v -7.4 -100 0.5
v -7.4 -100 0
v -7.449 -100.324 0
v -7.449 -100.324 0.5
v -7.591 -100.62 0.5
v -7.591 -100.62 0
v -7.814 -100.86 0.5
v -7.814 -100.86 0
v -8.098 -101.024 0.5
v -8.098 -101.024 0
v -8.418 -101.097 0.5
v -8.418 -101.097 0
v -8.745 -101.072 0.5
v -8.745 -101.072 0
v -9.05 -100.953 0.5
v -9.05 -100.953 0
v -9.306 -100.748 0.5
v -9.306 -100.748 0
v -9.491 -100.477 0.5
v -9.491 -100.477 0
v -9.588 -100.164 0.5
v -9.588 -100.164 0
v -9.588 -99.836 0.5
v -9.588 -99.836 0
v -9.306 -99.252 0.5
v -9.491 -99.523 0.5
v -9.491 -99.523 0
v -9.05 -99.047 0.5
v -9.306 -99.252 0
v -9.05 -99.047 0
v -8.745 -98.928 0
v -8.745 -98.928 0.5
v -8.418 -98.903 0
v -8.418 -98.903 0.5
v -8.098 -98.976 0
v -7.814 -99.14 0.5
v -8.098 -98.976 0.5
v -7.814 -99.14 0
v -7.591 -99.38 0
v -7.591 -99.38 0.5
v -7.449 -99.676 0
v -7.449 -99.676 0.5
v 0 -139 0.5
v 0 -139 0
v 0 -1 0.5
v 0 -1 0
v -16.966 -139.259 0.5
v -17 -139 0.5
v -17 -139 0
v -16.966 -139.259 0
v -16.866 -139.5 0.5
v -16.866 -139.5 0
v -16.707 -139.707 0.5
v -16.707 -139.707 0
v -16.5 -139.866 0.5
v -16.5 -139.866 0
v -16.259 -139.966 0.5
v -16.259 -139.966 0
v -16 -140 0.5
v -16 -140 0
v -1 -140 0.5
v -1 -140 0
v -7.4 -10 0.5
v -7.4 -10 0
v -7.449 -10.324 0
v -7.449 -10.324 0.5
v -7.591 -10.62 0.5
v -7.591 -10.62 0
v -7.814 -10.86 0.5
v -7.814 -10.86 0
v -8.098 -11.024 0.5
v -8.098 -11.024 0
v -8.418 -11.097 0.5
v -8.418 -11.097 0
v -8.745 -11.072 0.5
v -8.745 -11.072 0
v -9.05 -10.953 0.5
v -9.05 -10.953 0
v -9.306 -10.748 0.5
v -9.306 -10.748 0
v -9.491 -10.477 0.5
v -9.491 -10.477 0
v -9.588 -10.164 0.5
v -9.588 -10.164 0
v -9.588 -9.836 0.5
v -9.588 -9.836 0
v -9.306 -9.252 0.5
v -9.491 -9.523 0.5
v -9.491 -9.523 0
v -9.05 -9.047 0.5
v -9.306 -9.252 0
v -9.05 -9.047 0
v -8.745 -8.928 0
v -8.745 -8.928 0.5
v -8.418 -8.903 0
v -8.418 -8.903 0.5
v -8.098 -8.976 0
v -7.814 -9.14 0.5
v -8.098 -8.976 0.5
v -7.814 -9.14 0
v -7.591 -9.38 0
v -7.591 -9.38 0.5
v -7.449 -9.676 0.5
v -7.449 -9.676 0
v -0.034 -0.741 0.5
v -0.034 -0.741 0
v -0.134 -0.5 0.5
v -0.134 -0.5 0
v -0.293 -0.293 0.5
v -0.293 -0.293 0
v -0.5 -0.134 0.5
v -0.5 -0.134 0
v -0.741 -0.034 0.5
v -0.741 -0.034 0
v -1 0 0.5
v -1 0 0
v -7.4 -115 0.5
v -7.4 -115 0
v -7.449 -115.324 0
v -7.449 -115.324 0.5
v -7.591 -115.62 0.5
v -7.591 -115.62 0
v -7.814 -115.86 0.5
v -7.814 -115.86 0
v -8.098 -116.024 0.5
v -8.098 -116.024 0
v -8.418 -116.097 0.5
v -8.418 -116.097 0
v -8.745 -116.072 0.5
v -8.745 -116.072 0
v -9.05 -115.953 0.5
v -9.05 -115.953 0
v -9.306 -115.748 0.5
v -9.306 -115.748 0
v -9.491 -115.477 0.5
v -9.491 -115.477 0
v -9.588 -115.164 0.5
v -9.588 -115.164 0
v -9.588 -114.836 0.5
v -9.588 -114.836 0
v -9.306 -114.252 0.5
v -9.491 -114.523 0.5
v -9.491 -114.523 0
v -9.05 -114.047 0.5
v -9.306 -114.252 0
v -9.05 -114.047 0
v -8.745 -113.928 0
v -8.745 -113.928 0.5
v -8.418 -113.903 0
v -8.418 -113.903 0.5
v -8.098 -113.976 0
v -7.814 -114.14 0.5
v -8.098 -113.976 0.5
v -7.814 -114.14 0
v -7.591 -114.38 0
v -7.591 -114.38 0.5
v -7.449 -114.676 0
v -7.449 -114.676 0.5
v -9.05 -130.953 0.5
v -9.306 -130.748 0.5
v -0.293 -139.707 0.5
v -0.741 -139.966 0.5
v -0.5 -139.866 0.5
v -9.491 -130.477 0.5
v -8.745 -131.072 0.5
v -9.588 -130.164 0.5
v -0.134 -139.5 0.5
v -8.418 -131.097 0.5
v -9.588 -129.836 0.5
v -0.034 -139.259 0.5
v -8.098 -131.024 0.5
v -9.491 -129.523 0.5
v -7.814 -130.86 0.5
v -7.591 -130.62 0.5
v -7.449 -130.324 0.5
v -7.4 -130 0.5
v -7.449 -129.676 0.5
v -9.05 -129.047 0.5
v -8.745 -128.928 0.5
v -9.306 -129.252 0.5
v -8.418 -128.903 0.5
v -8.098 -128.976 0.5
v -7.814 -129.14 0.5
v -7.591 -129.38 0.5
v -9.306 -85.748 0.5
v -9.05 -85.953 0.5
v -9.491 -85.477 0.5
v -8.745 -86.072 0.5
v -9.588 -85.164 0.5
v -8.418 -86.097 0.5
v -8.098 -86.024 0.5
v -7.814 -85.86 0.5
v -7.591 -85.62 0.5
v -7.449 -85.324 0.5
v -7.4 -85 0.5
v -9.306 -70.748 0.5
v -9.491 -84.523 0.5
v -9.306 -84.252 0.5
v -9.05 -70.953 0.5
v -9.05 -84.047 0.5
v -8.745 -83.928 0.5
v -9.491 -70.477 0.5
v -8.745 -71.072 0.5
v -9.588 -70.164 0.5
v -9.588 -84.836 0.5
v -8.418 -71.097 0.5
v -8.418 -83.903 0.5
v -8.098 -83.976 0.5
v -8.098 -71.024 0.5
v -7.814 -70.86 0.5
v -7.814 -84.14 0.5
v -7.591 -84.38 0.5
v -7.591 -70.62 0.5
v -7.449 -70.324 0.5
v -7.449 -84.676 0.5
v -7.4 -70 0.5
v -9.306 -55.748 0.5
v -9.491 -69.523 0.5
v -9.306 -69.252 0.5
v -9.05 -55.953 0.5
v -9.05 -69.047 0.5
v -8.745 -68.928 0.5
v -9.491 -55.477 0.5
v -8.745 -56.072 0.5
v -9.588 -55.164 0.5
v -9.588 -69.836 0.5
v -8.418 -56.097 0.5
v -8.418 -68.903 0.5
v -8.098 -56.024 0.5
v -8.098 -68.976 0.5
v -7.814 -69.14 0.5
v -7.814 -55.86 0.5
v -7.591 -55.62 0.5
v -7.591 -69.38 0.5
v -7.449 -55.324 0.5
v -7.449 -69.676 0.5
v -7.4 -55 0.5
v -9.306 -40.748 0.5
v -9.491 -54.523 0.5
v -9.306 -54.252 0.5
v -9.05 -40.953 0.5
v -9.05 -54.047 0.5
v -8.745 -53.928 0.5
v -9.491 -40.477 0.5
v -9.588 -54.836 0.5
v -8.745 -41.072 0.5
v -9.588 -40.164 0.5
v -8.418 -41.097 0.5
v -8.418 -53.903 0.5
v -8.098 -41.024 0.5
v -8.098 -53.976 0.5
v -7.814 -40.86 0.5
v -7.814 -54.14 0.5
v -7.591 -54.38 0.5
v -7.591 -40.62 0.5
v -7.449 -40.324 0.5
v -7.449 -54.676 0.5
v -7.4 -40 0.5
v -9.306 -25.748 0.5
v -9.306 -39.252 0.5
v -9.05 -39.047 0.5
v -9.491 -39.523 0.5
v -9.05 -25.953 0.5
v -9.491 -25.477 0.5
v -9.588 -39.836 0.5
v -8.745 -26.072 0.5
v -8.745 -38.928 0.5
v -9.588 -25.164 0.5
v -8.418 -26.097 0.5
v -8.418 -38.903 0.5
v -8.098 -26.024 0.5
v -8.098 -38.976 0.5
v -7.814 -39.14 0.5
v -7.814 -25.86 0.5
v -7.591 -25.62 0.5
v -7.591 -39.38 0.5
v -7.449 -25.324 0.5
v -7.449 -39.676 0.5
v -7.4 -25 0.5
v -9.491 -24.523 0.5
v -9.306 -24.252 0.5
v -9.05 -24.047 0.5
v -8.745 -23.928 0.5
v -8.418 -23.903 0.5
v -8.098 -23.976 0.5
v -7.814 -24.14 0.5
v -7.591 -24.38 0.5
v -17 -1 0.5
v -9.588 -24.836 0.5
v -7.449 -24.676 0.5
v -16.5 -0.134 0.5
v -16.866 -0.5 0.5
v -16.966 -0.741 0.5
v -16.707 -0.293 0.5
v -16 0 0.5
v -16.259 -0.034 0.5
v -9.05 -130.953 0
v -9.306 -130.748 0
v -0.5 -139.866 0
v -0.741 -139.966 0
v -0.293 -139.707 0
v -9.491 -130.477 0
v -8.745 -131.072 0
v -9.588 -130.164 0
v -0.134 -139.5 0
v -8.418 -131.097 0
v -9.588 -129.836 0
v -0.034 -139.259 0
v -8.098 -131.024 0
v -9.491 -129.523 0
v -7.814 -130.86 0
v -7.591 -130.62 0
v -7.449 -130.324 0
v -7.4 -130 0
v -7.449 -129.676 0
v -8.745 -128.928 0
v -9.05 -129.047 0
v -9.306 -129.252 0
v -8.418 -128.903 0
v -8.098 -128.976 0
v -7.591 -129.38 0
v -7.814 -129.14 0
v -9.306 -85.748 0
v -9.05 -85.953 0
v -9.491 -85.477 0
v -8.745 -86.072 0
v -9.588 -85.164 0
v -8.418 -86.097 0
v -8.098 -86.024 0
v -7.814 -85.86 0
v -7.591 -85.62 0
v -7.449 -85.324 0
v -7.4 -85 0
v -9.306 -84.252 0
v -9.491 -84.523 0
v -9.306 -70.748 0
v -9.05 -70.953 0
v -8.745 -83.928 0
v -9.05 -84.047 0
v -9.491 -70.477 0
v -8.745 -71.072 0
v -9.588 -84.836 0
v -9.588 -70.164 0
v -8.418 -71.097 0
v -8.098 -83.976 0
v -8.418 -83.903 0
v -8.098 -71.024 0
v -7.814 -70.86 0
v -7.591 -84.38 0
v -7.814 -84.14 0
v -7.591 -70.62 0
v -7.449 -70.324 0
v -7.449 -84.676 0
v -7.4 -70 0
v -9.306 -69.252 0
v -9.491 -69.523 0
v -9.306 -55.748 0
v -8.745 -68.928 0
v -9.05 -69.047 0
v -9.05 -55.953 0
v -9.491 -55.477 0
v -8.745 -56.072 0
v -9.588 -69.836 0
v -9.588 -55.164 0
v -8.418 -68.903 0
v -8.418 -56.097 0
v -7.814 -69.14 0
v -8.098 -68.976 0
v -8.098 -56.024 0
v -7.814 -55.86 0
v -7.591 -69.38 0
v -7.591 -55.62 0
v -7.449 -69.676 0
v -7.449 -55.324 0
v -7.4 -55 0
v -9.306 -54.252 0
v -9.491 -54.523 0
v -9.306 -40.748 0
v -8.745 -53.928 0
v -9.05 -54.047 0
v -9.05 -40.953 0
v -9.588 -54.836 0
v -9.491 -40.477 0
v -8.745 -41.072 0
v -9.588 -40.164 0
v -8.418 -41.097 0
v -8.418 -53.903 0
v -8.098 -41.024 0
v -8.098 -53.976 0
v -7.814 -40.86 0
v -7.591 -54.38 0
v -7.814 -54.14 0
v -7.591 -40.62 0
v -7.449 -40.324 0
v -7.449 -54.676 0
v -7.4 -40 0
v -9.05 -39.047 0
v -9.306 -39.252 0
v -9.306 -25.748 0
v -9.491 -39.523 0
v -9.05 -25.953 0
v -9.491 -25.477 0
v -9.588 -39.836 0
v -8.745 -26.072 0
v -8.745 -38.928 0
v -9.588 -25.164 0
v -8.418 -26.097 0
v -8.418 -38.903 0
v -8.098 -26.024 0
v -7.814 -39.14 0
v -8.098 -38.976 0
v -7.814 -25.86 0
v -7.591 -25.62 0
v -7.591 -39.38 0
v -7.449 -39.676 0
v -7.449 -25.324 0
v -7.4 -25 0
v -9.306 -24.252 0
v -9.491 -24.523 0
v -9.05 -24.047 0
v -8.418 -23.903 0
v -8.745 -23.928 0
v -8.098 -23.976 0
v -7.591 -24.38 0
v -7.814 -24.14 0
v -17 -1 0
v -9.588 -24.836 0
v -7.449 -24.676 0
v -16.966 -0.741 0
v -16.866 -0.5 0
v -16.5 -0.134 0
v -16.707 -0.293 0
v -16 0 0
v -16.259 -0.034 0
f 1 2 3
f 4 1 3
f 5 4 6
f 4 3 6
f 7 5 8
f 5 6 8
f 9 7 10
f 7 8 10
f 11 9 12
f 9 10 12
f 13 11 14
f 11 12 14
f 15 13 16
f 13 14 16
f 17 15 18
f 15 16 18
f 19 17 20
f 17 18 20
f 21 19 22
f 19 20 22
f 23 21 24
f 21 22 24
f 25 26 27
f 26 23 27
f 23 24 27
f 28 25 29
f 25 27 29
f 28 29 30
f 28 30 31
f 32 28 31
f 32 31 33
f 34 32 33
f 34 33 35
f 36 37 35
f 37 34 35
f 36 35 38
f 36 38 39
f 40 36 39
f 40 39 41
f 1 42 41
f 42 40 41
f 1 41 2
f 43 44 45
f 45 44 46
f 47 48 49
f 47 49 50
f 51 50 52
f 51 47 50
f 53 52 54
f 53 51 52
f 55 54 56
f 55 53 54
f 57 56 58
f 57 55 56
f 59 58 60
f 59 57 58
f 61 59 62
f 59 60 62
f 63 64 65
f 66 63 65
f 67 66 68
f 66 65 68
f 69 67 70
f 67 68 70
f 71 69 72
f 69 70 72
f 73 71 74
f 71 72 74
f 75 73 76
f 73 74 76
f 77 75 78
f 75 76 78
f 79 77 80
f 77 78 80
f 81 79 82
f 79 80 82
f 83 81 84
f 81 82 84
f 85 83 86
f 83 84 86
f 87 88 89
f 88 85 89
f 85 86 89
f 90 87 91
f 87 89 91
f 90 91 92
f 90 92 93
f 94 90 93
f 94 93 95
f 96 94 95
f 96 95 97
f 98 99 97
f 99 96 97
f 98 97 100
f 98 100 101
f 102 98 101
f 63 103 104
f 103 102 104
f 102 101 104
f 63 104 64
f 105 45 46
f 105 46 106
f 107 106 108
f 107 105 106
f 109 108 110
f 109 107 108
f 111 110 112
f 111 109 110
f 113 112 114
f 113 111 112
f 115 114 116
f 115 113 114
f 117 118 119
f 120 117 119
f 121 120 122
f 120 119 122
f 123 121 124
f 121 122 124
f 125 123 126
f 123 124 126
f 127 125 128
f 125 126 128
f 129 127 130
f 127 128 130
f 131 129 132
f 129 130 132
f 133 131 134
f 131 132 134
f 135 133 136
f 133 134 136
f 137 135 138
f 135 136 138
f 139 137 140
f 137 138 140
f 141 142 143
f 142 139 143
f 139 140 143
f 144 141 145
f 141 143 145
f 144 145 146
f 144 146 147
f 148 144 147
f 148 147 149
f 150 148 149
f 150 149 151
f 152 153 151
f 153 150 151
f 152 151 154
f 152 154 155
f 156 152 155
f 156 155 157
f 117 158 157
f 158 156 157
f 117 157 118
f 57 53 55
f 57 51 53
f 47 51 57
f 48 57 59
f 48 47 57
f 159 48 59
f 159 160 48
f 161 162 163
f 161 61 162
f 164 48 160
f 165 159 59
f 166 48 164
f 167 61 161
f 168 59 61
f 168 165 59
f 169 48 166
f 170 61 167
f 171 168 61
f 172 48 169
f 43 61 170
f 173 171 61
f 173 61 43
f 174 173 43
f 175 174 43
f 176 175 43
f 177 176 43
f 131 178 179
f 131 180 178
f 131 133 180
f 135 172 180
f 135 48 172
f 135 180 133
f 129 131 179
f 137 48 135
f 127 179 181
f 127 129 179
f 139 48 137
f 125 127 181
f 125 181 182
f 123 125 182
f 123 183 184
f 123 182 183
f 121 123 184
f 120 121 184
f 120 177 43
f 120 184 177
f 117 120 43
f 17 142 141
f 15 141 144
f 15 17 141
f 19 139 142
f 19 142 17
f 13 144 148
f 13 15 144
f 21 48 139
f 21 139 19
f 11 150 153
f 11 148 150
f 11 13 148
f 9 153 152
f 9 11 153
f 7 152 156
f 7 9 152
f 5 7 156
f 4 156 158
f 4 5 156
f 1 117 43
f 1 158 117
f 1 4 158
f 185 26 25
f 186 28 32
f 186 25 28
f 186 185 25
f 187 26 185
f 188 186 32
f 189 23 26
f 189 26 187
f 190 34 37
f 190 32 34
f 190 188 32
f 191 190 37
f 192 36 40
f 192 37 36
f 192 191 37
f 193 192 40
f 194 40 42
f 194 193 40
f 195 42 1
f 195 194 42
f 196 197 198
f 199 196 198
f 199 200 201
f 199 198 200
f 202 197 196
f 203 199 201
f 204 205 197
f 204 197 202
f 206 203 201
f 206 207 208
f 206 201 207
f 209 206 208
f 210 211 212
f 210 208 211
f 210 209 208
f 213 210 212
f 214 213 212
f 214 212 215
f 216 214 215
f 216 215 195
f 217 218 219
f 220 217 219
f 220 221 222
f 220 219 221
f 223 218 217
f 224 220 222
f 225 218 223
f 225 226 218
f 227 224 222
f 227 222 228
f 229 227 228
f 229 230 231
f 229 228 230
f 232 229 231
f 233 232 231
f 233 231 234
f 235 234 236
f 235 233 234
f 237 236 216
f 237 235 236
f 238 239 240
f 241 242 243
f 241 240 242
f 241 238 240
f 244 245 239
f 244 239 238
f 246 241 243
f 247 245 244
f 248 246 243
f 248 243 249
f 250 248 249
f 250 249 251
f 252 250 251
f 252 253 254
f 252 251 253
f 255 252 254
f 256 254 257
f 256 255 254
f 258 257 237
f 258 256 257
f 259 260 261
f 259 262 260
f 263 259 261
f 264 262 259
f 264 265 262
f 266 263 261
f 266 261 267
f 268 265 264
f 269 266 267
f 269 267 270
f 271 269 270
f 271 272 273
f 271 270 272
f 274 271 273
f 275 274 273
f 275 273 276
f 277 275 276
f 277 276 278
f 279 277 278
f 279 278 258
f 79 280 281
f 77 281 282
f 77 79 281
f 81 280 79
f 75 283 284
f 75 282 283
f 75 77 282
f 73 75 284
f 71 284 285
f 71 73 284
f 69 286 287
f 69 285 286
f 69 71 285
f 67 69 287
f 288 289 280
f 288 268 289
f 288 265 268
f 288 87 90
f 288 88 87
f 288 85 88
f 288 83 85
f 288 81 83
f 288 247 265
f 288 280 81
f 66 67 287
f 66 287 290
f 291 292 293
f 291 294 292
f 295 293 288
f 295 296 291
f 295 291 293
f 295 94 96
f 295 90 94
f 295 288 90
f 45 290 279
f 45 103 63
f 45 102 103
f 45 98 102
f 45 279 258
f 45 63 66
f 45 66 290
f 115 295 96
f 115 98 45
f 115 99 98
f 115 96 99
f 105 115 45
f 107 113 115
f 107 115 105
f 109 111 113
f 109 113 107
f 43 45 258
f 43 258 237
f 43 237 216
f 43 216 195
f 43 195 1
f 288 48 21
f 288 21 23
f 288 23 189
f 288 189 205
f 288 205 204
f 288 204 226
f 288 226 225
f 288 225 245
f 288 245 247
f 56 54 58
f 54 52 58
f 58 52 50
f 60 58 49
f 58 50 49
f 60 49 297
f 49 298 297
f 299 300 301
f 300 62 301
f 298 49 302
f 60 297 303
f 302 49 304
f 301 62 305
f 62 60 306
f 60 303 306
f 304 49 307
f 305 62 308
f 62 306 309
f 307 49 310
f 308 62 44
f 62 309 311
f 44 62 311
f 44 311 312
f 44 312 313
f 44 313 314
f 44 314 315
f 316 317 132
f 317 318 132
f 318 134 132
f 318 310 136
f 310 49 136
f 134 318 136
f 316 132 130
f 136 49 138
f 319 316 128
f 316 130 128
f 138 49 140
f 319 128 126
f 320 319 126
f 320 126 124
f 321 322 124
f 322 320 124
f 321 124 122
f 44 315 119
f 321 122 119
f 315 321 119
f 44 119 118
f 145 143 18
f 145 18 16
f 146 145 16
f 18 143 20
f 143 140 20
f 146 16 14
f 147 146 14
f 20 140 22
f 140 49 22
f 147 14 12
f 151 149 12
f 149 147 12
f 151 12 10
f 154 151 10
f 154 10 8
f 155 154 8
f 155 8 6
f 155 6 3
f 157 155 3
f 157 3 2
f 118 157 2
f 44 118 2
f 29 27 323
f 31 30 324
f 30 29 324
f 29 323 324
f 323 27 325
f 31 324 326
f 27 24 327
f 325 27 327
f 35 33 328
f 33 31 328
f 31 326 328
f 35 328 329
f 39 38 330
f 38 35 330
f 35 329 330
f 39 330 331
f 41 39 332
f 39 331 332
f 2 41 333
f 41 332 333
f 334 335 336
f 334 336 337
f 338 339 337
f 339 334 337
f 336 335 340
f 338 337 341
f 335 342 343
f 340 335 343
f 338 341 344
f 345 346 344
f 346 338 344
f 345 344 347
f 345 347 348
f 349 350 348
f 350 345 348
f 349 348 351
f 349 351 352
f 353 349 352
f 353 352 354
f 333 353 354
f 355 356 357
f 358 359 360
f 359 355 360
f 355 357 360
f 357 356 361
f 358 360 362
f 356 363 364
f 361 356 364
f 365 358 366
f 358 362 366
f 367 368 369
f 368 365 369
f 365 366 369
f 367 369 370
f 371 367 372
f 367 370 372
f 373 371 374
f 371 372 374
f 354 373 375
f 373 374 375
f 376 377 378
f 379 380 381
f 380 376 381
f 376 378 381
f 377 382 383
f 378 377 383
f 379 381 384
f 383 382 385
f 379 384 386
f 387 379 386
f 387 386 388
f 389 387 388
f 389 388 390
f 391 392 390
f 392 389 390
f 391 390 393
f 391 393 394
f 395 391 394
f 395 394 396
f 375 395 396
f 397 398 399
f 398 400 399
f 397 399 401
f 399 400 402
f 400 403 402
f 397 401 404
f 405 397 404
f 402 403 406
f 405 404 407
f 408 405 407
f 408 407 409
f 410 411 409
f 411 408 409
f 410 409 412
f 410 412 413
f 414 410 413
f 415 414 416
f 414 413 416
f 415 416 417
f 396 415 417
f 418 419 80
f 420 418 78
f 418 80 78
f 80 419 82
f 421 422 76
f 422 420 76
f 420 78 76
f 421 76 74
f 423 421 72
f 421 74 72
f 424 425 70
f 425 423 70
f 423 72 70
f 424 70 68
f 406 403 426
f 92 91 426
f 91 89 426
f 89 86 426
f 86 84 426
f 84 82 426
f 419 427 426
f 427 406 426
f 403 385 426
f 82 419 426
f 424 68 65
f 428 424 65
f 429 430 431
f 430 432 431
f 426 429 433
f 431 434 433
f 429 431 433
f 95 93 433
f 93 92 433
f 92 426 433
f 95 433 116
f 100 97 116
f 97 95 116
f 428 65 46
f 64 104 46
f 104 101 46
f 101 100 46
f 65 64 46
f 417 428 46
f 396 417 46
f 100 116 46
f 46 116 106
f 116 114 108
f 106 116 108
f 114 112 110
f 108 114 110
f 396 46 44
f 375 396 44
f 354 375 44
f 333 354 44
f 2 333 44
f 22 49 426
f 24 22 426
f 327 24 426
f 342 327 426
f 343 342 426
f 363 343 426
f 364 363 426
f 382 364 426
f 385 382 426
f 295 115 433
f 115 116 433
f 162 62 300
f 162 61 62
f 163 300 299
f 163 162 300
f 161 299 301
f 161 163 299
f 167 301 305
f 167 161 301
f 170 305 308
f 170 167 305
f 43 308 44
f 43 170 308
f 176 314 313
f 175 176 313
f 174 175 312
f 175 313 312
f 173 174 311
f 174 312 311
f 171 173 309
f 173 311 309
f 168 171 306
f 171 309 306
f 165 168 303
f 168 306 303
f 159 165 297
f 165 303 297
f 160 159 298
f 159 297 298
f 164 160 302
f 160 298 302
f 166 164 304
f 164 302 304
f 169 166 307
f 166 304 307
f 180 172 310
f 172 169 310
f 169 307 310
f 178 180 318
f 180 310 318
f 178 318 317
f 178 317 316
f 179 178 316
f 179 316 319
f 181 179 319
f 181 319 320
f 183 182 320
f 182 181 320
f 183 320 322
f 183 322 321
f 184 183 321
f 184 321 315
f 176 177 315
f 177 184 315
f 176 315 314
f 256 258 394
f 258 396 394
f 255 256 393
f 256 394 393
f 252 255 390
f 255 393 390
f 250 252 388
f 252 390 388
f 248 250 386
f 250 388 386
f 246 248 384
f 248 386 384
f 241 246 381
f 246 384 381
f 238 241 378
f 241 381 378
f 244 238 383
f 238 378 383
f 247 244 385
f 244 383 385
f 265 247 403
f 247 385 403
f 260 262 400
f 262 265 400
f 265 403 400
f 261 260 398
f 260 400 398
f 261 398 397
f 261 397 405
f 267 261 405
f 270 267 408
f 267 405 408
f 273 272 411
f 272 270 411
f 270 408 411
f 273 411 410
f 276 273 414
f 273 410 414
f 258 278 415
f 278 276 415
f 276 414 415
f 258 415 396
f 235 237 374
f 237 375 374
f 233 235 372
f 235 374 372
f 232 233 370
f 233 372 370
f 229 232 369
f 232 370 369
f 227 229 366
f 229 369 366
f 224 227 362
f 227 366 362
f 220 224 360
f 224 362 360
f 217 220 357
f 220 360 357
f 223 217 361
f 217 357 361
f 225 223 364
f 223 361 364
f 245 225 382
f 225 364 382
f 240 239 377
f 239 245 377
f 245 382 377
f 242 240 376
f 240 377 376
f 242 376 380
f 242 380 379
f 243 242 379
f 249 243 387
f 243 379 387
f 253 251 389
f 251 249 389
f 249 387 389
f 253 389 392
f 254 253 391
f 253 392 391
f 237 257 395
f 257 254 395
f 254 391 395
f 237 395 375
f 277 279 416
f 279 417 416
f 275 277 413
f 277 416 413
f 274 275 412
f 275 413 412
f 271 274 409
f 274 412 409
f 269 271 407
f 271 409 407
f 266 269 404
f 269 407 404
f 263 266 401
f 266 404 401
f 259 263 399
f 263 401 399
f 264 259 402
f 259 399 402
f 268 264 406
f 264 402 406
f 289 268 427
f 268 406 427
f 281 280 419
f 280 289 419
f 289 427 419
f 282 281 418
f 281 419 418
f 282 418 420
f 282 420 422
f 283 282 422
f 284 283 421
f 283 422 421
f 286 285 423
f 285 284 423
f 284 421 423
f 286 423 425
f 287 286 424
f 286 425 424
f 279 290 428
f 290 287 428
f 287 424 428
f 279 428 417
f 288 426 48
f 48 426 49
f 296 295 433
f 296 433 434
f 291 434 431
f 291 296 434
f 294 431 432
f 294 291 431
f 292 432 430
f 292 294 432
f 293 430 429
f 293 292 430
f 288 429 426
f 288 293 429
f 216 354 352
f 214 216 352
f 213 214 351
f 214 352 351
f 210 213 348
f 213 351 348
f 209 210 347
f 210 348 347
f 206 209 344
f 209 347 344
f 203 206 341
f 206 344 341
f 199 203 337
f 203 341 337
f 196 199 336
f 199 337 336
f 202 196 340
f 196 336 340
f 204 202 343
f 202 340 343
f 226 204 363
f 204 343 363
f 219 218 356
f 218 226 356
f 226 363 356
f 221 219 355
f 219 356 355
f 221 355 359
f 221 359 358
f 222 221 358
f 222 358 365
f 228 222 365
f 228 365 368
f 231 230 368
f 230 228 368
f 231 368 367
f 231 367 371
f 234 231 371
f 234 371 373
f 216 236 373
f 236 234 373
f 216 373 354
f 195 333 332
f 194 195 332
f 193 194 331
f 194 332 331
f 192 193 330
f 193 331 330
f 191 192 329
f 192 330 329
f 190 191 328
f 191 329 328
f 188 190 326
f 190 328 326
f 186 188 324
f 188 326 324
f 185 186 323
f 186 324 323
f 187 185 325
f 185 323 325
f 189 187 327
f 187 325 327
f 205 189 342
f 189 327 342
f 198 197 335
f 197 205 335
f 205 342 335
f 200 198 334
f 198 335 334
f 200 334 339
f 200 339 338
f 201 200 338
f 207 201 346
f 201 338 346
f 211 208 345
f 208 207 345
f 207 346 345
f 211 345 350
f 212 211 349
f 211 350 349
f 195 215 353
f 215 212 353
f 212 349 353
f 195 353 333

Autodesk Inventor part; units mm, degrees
ref_plane "YZ Plane" through (0, 0, 0) normal (1, 0, 0) x (0, 1, 0)
ref_plane "XZ Plane" through (0, 0, 0) normal (0, 1, 0) x (-1, 0, 0)
ref_plane "XY Plane" through (0, 0, 0) normal (0, 0, 1) x (1, 0, 0)
sketch "スケッチ1" plane through (0, 0, 0) normal (0, 0, 1) x (1, 0, 0)
  line L0 (0, 0) -> (-17, 0)
  line L1 (-17, 0) -> (-17, -140)
  line L2 (-17, -140) -> (0, -140)
  line L3 (0, -140) -> (0, 0)
  circle A0 centre (-8.5, -130) radius 1.1
  circle A1 centre (-8.5, -115) radius 1.1
  circle A2 centre (-8.5, -100) radius 1.1
  circle A3 centre (-8.5, -85) radius 1.1
  circle A4 centre (-8.5, -70) radius 1.1
  circle A5 centre (-8.5, -55) radius 1.1
  circle A6 centre (-8.5, -40) radius 1.1
  circle A7 centre (-8.5, -25) radius 1.1
  circle A8 centre (-8.5, -10) radius 1.1
  dimension "d0" = 140
  dimension "d1" = 17
  dimension "d2" = 2.2
  dimension "d3" = 10
  dimension "d4" = 8.5
  dimension "d7" = 15
extrude "押し出し1" add sketch "スケッチ1" along normal blind 0.5
fillet "フィレット1" radius 1 4 edges at (-17, -140, 0.25) (0, -140, 0.25) (0, 0, 0.25) (-17, 0, 0.25)
equation "\"d4\" = 0.5 * d1"
properties part number "Old-sheet"
